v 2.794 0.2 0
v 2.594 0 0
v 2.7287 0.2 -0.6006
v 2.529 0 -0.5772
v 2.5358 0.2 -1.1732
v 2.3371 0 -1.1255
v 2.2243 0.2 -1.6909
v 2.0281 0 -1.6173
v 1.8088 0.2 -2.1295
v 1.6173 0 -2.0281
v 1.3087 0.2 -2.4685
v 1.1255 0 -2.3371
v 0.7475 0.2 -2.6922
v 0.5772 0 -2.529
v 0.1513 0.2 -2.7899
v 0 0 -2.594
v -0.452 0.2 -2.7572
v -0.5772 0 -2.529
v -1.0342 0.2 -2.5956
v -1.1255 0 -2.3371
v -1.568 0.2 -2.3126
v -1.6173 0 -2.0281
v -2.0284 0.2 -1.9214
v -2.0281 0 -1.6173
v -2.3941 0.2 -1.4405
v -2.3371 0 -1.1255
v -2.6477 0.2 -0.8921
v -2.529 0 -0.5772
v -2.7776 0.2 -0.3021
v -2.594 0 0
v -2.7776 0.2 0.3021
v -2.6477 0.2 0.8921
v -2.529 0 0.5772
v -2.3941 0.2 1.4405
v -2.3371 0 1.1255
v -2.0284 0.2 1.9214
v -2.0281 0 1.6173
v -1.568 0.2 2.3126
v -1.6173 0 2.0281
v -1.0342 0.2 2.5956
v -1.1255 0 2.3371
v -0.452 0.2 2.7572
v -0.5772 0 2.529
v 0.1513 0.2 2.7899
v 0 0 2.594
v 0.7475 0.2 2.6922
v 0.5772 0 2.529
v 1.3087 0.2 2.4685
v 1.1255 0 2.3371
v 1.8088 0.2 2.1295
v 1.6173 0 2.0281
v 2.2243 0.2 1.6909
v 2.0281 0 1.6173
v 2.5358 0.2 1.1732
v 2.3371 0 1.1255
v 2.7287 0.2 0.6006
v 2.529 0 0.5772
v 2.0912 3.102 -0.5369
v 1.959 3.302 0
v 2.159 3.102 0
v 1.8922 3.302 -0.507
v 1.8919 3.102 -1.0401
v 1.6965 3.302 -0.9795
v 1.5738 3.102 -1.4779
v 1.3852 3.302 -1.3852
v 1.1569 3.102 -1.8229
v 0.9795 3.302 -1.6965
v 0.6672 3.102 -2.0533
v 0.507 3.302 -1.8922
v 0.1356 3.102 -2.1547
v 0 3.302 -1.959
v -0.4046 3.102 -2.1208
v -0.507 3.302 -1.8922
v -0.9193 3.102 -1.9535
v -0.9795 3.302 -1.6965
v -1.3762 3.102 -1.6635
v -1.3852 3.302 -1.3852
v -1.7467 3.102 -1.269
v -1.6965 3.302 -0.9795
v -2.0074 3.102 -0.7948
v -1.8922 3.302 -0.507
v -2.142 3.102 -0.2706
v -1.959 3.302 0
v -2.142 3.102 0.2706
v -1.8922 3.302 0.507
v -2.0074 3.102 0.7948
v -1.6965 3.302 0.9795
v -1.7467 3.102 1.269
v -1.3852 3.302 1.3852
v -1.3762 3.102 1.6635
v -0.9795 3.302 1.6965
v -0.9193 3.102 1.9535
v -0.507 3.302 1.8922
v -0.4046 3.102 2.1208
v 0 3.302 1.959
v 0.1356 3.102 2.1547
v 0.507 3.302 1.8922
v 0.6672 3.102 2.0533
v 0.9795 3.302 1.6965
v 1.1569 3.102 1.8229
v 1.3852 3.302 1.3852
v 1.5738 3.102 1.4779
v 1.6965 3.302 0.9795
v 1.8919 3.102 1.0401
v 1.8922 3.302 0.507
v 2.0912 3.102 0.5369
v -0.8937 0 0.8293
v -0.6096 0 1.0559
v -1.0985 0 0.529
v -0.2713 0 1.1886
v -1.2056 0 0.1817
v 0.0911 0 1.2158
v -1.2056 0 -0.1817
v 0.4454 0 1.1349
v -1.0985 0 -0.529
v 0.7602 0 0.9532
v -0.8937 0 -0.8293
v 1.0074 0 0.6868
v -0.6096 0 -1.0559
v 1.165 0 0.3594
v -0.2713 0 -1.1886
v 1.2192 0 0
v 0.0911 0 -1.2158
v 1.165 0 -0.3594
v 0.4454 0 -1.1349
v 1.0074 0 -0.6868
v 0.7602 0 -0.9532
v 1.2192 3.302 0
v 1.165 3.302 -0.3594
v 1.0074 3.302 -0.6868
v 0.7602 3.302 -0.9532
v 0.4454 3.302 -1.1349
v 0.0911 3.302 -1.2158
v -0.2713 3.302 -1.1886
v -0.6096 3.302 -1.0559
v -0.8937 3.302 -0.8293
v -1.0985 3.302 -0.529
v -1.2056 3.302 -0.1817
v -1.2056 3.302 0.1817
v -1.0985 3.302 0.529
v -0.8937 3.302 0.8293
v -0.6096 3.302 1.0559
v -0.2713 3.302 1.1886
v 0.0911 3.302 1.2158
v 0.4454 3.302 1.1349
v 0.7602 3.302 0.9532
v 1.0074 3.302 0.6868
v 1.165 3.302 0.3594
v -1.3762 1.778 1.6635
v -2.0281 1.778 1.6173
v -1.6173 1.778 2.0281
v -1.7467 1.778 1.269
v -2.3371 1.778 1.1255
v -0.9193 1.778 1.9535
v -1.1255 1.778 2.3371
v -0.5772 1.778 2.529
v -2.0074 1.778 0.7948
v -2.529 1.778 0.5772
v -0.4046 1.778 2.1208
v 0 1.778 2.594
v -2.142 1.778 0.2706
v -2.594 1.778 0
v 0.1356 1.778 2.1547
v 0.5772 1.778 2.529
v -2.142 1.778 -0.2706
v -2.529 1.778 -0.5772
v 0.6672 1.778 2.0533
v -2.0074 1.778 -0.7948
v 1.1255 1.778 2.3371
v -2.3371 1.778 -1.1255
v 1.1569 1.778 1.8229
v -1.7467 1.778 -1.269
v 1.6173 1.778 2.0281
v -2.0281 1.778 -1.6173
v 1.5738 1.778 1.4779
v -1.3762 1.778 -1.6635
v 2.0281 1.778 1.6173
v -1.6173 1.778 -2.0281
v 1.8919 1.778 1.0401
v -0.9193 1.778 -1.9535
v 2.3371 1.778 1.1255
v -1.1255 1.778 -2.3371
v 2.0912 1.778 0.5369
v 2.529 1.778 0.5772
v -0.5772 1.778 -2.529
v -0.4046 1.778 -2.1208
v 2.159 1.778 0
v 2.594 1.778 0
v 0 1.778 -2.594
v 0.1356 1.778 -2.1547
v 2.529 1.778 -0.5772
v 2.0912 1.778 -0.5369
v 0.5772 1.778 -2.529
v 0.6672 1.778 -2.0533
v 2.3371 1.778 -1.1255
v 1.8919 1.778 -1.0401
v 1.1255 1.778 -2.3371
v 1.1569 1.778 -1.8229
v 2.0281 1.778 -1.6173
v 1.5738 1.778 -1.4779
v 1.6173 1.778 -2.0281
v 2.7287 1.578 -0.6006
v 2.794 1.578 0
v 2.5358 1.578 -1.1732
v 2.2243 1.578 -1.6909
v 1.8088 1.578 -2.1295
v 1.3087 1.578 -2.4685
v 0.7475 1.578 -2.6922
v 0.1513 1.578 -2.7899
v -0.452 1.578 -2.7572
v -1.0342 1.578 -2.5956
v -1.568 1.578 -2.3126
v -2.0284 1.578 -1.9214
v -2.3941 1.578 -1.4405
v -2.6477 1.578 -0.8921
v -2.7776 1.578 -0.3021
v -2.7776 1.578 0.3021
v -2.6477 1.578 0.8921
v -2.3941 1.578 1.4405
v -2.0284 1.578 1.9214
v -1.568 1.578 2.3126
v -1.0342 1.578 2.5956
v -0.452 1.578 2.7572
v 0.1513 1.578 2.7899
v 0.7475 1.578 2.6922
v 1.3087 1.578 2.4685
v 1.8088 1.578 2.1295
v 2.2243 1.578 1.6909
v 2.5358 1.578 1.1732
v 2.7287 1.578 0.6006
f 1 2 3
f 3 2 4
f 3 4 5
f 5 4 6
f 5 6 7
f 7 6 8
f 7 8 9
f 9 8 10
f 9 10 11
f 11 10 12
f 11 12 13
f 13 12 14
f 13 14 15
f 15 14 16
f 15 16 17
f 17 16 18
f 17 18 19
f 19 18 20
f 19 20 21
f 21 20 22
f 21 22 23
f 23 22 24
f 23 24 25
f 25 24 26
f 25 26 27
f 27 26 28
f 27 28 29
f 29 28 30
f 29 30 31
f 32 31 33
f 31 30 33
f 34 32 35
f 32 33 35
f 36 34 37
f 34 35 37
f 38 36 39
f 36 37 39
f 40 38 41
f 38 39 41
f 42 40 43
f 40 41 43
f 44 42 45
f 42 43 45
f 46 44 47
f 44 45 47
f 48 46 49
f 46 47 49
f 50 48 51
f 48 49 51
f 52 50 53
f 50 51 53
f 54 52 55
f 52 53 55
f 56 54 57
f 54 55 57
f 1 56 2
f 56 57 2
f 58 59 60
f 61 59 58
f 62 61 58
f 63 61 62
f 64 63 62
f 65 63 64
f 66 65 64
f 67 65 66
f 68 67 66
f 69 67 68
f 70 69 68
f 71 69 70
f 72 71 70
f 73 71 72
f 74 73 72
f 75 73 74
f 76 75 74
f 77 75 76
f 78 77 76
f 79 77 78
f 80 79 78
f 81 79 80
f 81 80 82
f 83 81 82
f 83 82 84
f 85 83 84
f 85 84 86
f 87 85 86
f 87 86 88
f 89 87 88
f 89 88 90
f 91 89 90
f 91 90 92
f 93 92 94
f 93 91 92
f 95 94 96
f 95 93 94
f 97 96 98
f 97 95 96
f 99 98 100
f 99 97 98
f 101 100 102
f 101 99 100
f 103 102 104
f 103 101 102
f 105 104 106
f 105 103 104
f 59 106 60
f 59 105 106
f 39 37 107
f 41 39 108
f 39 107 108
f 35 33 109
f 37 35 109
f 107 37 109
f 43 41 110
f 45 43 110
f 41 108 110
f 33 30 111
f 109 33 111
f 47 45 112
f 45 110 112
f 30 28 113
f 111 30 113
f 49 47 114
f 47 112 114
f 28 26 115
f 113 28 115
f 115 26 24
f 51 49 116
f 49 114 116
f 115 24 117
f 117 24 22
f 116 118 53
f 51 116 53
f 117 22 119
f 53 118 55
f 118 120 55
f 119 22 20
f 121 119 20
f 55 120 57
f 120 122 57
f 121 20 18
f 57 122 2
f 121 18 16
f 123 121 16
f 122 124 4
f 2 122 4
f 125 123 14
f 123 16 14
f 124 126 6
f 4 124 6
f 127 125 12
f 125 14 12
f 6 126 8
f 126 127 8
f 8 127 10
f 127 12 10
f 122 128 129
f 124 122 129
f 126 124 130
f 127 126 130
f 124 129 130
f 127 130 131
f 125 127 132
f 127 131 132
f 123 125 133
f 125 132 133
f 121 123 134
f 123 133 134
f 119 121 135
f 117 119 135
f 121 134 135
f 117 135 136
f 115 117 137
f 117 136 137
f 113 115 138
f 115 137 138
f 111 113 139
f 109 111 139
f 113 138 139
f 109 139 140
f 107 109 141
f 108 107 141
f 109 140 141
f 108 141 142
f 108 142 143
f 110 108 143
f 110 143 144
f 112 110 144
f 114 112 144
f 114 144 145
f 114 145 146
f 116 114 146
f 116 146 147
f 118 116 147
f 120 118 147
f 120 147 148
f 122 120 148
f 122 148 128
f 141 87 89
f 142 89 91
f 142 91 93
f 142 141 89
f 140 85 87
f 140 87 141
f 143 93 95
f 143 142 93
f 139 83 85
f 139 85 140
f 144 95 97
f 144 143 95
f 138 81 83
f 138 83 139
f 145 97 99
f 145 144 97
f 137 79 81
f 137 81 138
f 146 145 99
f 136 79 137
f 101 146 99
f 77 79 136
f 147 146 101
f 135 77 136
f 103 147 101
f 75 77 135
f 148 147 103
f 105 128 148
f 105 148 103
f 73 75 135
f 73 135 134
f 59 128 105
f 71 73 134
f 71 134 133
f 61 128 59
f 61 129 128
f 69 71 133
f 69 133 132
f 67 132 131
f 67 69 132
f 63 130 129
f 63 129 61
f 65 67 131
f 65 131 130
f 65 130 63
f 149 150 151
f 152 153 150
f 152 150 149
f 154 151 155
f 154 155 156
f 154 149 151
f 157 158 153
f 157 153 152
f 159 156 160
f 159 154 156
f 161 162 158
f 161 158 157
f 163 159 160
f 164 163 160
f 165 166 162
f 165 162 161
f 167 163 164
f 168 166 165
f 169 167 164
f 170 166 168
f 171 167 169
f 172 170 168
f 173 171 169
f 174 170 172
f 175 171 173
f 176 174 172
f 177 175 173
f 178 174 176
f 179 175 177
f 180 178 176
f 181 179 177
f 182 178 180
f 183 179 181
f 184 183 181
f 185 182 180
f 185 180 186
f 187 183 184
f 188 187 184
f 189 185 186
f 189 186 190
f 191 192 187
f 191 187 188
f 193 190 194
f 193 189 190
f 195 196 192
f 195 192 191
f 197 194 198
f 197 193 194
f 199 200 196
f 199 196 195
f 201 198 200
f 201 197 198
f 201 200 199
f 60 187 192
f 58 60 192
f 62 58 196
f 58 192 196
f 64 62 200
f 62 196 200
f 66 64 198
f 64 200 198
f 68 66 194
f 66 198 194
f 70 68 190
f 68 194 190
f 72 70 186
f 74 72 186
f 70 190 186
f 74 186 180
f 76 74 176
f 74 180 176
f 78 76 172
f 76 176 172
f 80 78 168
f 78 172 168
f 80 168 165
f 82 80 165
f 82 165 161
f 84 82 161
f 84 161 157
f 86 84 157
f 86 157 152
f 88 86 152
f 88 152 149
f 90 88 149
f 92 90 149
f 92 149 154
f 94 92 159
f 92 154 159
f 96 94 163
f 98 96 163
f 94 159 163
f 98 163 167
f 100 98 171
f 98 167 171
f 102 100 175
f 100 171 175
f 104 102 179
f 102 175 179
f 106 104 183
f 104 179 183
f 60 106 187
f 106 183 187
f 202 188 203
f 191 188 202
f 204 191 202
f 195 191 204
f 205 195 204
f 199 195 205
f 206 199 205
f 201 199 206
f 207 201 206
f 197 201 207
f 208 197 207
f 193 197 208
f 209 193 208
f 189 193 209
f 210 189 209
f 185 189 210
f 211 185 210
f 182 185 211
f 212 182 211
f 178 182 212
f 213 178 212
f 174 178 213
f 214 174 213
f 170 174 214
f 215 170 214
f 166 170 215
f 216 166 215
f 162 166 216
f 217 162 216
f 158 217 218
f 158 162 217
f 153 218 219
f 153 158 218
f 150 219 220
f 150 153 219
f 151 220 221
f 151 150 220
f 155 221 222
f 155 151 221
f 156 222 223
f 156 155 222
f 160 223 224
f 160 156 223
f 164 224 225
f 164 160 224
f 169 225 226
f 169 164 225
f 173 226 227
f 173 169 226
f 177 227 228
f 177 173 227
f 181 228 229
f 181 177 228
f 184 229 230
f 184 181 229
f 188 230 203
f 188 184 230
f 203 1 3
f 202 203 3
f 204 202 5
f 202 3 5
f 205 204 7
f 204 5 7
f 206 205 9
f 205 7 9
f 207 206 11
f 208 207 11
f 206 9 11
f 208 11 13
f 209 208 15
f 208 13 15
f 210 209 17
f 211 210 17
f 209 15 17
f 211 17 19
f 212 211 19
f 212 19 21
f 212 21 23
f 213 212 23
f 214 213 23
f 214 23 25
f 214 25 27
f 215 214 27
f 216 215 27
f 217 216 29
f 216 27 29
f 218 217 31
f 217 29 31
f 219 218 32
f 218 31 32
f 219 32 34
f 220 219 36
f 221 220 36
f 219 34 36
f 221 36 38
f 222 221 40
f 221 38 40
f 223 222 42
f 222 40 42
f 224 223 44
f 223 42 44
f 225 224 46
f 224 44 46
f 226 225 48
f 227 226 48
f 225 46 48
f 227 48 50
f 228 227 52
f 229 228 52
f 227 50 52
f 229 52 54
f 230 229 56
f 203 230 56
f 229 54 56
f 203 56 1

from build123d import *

# Parameters (mm, degrees)
SKETCH1_R           = 2.794
BOSS_EXTRUDE1_DEPTH = 1.778
CHAMFER1_SIZE       = 0.2
SKETCH2_R           = 2.159
BOSS_EXTRUDE2_DEPTH = 1.524
CHAMFER2_SIZE       = 0.2
SKETCH3_R           = 1.2192
CUT_EXTRUDE1_DEPTH  = 4.302


with BuildPart() as part:
    # Sketch1 → Boss-Extrude1 (new body)
    with BuildSketch(Plane(origin=(0, 0, 0), x_dir=(1, 0, 0), z_dir=(0, 1, 0))):
        Circle(SKETCH1_R)
    extrude(amount=BOSS_EXTRUDE1_DEPTH)

    # Chamfer1
    chamfer1_edges = [part.edges().sort_by_distance(p)[0] for p in [
        (-2.794, 0, 0),
        (-2.794, 1.778, 0),
    ]]
    chamfer(chamfer1_edges, length=CHAMFER1_SIZE)

    # Sketch2 → Boss-Extrude2 (add)
    with BuildSketch(Plane(origin=(0, 1.778, 0), x_dir=(1, 0, 0), z_dir=(0, 1, 0))):
        Circle(SKETCH2_R)
    extrude(amount=BOSS_EXTRUDE2_DEPTH)

    # Chamfer2
    chamfer2_edges = [part.edges().sort_by_distance(p)[0] for p in [
        (-2.159, 3.302, 0),
    ]]
    chamfer(chamfer2_edges, length=CHAMFER2_SIZE)

    # Sketch3 → Cut-Extrude1 (cut, through all)
    with BuildSketch(Plane(origin=(0, 3.302, 0), x_dir=(1, 0, 0), z_dir=(0, 1, 0))):
        Circle(SKETCH3_R)
    extrude(amount=-CUT_EXTRUDE1_DEPTH, mode=Mode.SUBTRACT)


solid = part.part
